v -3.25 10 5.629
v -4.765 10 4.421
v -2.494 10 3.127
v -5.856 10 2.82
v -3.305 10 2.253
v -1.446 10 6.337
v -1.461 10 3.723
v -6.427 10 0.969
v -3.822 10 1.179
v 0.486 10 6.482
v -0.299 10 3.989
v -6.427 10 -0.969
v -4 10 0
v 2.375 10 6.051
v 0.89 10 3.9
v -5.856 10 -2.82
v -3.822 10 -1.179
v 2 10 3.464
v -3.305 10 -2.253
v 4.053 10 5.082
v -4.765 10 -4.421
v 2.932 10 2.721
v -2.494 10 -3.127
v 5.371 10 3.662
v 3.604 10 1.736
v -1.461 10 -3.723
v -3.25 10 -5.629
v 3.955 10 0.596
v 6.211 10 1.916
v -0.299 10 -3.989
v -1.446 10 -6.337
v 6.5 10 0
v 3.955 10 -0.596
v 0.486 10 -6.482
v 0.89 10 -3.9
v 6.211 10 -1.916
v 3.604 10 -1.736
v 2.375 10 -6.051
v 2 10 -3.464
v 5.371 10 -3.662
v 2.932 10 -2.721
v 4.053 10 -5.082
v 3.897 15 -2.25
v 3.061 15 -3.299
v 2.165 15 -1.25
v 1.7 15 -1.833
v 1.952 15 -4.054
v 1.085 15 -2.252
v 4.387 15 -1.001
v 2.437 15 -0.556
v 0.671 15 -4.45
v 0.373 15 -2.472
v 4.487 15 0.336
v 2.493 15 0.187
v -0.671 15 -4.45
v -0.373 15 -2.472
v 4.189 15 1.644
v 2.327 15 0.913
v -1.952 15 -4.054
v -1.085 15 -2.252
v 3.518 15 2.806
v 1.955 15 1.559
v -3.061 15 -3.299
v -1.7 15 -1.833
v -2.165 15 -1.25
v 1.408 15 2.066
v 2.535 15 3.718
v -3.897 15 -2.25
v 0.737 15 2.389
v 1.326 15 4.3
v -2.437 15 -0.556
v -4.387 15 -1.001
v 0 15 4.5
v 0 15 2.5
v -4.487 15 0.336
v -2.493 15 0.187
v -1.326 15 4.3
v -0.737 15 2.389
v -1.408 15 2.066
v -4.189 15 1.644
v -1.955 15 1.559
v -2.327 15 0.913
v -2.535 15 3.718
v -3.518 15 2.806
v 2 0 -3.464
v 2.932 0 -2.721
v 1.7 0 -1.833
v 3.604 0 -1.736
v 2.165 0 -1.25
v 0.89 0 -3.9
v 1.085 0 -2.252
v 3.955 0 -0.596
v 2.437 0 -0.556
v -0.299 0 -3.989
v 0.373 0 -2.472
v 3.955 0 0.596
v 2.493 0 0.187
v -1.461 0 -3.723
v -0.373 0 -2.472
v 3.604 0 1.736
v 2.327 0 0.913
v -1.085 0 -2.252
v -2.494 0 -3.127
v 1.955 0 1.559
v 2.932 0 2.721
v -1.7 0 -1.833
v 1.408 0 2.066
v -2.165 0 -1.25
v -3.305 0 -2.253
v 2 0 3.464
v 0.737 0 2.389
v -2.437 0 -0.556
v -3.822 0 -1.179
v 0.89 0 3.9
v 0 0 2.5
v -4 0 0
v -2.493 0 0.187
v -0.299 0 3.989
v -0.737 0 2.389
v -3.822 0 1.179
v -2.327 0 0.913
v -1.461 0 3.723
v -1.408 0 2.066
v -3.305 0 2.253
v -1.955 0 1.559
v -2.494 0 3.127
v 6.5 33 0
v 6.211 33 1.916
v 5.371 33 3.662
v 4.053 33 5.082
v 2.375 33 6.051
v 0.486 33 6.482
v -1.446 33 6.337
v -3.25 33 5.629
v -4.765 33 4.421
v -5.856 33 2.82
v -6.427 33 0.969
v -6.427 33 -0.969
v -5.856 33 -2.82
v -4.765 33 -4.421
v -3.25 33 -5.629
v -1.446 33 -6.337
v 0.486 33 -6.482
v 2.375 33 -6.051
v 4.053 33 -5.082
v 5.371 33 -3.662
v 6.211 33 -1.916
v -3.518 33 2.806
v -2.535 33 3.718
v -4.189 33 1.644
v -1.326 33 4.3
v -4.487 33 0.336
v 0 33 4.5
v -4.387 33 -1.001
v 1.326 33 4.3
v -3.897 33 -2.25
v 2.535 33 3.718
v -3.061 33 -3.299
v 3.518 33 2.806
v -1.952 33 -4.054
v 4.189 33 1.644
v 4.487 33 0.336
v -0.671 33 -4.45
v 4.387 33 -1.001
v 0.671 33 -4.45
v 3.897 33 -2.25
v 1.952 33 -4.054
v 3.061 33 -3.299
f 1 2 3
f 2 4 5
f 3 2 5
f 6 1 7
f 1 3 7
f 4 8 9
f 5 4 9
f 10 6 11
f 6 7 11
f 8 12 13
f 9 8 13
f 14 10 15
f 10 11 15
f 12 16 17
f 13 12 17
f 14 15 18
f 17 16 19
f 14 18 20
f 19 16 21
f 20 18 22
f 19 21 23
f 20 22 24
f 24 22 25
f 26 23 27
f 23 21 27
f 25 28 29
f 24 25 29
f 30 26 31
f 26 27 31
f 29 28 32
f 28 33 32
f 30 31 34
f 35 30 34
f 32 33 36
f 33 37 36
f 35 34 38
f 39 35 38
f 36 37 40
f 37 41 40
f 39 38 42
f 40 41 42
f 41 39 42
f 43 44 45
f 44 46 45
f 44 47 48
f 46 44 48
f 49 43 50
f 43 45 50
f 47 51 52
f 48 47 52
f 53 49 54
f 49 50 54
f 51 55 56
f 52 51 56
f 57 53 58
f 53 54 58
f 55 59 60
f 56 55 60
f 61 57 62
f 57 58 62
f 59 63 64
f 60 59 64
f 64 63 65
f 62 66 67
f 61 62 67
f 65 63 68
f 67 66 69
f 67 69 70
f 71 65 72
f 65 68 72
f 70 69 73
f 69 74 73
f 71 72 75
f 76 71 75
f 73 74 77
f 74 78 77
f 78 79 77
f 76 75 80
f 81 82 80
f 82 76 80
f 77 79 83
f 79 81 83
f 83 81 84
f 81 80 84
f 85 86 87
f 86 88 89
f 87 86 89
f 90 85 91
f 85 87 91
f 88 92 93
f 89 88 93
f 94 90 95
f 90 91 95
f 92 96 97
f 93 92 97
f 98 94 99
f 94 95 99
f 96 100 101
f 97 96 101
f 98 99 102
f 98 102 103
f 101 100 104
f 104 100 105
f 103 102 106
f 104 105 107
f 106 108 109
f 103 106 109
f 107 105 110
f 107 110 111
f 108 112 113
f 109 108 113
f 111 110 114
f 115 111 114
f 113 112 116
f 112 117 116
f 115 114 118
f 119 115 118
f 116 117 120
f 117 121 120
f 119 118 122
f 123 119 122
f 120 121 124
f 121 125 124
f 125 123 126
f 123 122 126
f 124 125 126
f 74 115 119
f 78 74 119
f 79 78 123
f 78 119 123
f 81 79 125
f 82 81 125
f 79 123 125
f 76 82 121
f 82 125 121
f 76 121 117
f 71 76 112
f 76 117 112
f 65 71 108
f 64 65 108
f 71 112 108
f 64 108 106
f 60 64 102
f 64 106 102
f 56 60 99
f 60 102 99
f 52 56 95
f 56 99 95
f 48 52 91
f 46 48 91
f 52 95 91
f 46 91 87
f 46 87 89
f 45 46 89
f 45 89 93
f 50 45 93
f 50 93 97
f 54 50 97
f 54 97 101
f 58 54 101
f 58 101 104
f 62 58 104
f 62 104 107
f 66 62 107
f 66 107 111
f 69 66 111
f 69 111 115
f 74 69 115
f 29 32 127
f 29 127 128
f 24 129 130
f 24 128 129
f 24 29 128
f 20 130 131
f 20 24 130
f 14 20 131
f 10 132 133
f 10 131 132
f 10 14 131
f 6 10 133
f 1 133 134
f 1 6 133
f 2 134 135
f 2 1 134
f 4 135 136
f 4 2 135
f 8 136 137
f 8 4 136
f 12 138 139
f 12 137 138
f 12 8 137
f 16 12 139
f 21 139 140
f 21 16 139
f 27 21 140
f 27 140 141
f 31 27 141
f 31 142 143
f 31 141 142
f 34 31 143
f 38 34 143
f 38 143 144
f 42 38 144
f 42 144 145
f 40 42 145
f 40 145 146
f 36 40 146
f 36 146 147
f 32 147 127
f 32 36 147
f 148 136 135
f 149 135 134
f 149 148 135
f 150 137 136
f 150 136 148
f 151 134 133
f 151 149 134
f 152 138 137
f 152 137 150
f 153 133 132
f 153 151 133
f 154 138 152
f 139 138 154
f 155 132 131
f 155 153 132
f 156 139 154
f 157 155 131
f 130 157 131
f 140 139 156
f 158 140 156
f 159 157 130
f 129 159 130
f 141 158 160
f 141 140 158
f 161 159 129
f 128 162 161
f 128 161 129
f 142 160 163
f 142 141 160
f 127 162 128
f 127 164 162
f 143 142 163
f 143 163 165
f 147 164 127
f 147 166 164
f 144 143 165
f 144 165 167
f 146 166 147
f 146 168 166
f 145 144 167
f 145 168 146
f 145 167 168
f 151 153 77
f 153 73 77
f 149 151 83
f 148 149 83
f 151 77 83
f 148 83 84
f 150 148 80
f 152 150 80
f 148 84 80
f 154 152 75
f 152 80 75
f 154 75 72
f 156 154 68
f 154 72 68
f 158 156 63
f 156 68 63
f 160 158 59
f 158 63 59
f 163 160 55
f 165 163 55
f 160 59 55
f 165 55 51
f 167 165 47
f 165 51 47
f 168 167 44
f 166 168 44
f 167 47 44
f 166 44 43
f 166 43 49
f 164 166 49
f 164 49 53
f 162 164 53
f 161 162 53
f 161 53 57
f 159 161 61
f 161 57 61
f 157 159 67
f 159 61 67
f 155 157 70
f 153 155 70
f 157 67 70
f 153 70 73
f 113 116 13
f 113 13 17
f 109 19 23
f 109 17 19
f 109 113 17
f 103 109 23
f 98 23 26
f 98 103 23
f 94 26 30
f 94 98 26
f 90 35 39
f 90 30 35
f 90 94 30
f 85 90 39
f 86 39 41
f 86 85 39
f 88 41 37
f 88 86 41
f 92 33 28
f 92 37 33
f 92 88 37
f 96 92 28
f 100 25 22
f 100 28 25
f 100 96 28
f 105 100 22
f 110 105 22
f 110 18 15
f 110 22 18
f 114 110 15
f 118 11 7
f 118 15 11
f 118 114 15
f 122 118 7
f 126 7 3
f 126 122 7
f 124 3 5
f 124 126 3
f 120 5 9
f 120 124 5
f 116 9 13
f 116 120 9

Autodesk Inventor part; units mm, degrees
ref_plane "YZ Plane" through (0, 0, 0) normal (1, 0, 0) x (0, 1, 0)
ref_plane "XZ Plane" through (0, 0, 0) normal (0, 1, 0) x (-1, 0, 0)
ref_plane "XY Plane" through (0, 0, 0) normal (0, 0, 1) x (1, 0, 0)
sketch "Sketch1" plane through (0, 0, 0) normal (0, 1, 0) x (-1, 0, 0)
  circle A0 centre (0, 0) radius 4
  dimension "d0" = 8
extrude "Extrusion1" add sketch "Sketch1" along normal blind 10
sketch "Sketch2" plane through (0, 10, 0) normal (0, 1, 0) x (1, 0, 0)
  circle A0 centre (0, 0) radius 6.5
  dimension "d3" = 13
extrude "Extrusion2" add sketch "Sketch2" along normal blind 23
sketch "Sketch3" plane through (0, 33, 0) normal (0, 1, 0) x (1, 0, 0)
  circle A0 centre (0, 0) radius 4.5
  dimension "d6" = 9
hole "Hole1" at (0, 33, 0) direction (0, -1, 0) diameter 5 depth 40 tip angle 118 counterbore diameter 9 counterbore depth 18
properties part number "Exhaust Pipe Connector"
